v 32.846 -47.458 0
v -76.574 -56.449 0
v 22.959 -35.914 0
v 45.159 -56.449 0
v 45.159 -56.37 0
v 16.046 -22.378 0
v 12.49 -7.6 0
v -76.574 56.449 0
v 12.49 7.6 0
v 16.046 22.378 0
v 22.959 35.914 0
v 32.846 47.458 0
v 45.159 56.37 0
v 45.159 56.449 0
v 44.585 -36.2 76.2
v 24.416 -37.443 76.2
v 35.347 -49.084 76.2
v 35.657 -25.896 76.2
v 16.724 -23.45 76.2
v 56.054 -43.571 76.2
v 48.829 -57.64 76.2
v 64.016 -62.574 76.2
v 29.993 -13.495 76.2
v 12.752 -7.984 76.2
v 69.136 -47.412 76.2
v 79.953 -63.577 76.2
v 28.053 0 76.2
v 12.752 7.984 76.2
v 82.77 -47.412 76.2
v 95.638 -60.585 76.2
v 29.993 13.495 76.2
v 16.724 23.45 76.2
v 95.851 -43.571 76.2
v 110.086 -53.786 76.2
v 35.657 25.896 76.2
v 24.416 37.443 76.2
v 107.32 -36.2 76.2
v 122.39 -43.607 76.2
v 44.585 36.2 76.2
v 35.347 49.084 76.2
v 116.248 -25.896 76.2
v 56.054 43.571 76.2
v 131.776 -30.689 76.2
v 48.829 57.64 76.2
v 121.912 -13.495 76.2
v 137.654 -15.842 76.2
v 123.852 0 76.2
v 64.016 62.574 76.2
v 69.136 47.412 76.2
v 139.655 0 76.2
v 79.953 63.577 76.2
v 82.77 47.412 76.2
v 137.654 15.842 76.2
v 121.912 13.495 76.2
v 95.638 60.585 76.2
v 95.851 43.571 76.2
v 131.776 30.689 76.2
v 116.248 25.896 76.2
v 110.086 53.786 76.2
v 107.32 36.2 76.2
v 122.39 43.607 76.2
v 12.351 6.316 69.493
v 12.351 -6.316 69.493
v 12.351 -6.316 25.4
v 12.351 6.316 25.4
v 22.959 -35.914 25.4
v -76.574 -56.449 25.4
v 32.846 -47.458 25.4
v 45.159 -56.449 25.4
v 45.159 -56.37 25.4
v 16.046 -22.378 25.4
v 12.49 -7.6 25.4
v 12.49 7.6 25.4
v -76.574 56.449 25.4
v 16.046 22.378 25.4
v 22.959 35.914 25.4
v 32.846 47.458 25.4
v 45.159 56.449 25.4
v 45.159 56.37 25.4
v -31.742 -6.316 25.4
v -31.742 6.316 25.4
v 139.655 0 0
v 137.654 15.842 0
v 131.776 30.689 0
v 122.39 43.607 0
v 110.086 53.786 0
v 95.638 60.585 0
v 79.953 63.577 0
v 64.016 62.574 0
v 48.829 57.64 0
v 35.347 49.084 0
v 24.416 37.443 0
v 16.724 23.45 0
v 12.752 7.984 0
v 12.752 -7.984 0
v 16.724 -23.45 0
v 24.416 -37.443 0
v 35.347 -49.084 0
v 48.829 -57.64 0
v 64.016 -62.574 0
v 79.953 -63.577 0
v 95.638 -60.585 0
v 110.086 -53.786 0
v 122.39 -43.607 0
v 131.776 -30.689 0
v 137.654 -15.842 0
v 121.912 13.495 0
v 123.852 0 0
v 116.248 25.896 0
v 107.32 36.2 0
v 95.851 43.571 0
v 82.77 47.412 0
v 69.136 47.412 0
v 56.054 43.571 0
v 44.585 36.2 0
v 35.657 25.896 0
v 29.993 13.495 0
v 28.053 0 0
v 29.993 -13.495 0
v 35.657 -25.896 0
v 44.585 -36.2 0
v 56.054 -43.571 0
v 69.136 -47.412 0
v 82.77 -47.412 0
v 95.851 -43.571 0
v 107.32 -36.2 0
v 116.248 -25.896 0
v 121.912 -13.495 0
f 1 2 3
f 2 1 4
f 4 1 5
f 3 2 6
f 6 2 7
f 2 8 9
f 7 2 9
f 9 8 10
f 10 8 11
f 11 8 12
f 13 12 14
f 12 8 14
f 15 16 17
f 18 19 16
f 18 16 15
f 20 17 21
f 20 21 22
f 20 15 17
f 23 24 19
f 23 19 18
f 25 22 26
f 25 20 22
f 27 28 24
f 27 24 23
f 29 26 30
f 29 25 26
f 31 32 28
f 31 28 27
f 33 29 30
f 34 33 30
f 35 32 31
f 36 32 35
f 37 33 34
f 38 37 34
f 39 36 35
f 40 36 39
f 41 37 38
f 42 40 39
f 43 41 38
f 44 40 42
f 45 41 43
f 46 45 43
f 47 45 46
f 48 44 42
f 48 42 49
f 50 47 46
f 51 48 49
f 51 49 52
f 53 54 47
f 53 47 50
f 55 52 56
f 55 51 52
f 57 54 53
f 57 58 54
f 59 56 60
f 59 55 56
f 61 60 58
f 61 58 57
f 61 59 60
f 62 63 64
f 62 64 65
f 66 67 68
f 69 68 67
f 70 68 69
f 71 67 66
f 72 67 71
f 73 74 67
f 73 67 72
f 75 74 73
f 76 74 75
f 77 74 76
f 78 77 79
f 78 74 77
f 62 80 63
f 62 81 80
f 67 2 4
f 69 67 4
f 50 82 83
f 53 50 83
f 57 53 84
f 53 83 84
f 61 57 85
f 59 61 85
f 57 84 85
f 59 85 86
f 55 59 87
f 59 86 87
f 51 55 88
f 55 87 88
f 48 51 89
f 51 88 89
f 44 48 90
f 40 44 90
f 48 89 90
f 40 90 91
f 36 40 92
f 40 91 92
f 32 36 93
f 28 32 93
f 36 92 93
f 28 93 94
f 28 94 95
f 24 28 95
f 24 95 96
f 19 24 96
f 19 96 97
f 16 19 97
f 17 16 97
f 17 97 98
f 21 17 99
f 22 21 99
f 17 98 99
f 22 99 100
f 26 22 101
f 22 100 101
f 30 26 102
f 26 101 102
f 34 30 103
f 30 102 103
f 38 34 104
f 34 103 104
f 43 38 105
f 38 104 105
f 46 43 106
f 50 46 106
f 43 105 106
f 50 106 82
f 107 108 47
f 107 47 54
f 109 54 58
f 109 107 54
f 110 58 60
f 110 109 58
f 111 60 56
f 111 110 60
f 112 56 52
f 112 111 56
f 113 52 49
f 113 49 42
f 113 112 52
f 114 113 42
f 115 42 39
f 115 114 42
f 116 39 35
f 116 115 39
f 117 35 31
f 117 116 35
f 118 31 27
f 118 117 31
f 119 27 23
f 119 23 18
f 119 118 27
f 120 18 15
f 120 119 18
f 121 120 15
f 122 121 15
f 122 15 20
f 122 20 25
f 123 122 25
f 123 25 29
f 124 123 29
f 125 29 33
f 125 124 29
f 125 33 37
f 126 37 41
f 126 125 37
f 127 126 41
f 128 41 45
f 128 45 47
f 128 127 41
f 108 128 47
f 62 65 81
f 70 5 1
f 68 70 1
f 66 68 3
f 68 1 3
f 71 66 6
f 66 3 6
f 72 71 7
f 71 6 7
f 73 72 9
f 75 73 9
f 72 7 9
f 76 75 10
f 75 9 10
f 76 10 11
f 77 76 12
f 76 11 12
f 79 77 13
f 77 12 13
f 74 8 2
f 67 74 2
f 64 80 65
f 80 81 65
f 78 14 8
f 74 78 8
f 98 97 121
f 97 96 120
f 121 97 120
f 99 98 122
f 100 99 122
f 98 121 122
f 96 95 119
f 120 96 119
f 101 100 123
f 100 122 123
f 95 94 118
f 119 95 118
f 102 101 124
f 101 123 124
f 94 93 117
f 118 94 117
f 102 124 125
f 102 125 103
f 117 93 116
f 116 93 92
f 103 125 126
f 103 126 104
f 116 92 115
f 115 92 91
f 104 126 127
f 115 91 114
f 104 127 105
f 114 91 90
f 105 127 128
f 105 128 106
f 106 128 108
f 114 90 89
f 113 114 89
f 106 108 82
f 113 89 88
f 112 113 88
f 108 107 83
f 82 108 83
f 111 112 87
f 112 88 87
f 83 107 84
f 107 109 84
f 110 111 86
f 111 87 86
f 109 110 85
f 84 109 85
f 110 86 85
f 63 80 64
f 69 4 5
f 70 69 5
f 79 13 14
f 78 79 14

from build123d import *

# Parameters (mm, degrees)
F1_DEPTH    = 25.4
F2_R        = 63.7025346574
F2_R_2      = 47.8996309488
F3_DEPTH    = 76.2
F5_DEPTH    = 44.45
F6_T1_DEPTH = 352.3005494338


# Not quite as in the source:
# - a fillet or chamfer that OpenCascade refuses, or shapes differently, is made with other operations: its cross-section is extruded or revolved along the edge and cut away or added


with BuildPart() as f1:
    # F0 (on Top) → F1 (new body)
    with BuildSketch(Plane.XY):
        with BuildLine():
            Line((45.1590158045, 56.4487725496), (-76.5739902854, 56.4487725496))
            Line((-76.5739902854, 56.4487725496), (-76.5739902854, -56.4487725496))
            Line((-76.5739902854, -56.4487725496), (45.1590158045, -56.4487725496))
            Line((45.1590158045, -56.4487725496), (45.1590158045, -56.369758806))
            ThreePointArc((45.1590158045, -56.369758806), (12.0414339826, 0), (45.1590158045, 56.369758806))
            Line((45.1590158045, 56.369758806), (45.1590158045, 56.4487725496))
        make_face()
    extrude(amount=F1_DEPTH)


with BuildPart() as f3:
    # F2 (on Top) → F3 (new body)
    with BuildSketch(Plane.XY):
        with Locations((75.9527087212, 0)):
            Circle(F2_R)
        with Locations((75.9527087212, 0)):
            Circle(F2_R_2, mode=Mode.SUBTRACT)
    extrude(amount=F3_DEPTH)


with BuildPart() as f5:
    # F4 (on face) → F5 (new body)
    with BuildSketch(Plane.XY.offset(25.4)):
        with BuildLine():
            ThreePointArc((12.3512934309, 6.3163301916), (12.0414339826, 0), (12.3512934309, -6.3163301916))
            Line((12.3512934309, -6.3163301916), (12.3512934309, 6.3163301916))
        make_face()
        with BuildLine():
            Line((-53.3321204942, -6.3163301916), (12.3512934309, -6.3163301916))
            ThreePointArc((12.3512934309, -6.3163301916), (12.0414339826, 0), (12.3512934309, 6.3163301916))
            Line((12.3512934309, 6.3163301916), (-53.3321204942, 6.3163301916))
            Line((-53.3321204942, 6.3163301916), (-53.3321204942, -6.3163301916))
        make_face()
    extrude(amount=F5_DEPTH)

    # F6: chamfer of 66.04 on 1 edges, made by hand

    # F6_s2 → F6_t1 (cut)
    with BuildSketch(Plane.XZ.offset(-176.1502747169)):
        Polygon((-53.3321204942, 3.81), (12.7078795058, 69.85), (-53.3321204942, 69.85), align=None)
    extrude(amount=F6_T1_DEPTH, mode=Mode.SUBTRACT)


solid = Compound([f1.part, f3.part, f5.part])
